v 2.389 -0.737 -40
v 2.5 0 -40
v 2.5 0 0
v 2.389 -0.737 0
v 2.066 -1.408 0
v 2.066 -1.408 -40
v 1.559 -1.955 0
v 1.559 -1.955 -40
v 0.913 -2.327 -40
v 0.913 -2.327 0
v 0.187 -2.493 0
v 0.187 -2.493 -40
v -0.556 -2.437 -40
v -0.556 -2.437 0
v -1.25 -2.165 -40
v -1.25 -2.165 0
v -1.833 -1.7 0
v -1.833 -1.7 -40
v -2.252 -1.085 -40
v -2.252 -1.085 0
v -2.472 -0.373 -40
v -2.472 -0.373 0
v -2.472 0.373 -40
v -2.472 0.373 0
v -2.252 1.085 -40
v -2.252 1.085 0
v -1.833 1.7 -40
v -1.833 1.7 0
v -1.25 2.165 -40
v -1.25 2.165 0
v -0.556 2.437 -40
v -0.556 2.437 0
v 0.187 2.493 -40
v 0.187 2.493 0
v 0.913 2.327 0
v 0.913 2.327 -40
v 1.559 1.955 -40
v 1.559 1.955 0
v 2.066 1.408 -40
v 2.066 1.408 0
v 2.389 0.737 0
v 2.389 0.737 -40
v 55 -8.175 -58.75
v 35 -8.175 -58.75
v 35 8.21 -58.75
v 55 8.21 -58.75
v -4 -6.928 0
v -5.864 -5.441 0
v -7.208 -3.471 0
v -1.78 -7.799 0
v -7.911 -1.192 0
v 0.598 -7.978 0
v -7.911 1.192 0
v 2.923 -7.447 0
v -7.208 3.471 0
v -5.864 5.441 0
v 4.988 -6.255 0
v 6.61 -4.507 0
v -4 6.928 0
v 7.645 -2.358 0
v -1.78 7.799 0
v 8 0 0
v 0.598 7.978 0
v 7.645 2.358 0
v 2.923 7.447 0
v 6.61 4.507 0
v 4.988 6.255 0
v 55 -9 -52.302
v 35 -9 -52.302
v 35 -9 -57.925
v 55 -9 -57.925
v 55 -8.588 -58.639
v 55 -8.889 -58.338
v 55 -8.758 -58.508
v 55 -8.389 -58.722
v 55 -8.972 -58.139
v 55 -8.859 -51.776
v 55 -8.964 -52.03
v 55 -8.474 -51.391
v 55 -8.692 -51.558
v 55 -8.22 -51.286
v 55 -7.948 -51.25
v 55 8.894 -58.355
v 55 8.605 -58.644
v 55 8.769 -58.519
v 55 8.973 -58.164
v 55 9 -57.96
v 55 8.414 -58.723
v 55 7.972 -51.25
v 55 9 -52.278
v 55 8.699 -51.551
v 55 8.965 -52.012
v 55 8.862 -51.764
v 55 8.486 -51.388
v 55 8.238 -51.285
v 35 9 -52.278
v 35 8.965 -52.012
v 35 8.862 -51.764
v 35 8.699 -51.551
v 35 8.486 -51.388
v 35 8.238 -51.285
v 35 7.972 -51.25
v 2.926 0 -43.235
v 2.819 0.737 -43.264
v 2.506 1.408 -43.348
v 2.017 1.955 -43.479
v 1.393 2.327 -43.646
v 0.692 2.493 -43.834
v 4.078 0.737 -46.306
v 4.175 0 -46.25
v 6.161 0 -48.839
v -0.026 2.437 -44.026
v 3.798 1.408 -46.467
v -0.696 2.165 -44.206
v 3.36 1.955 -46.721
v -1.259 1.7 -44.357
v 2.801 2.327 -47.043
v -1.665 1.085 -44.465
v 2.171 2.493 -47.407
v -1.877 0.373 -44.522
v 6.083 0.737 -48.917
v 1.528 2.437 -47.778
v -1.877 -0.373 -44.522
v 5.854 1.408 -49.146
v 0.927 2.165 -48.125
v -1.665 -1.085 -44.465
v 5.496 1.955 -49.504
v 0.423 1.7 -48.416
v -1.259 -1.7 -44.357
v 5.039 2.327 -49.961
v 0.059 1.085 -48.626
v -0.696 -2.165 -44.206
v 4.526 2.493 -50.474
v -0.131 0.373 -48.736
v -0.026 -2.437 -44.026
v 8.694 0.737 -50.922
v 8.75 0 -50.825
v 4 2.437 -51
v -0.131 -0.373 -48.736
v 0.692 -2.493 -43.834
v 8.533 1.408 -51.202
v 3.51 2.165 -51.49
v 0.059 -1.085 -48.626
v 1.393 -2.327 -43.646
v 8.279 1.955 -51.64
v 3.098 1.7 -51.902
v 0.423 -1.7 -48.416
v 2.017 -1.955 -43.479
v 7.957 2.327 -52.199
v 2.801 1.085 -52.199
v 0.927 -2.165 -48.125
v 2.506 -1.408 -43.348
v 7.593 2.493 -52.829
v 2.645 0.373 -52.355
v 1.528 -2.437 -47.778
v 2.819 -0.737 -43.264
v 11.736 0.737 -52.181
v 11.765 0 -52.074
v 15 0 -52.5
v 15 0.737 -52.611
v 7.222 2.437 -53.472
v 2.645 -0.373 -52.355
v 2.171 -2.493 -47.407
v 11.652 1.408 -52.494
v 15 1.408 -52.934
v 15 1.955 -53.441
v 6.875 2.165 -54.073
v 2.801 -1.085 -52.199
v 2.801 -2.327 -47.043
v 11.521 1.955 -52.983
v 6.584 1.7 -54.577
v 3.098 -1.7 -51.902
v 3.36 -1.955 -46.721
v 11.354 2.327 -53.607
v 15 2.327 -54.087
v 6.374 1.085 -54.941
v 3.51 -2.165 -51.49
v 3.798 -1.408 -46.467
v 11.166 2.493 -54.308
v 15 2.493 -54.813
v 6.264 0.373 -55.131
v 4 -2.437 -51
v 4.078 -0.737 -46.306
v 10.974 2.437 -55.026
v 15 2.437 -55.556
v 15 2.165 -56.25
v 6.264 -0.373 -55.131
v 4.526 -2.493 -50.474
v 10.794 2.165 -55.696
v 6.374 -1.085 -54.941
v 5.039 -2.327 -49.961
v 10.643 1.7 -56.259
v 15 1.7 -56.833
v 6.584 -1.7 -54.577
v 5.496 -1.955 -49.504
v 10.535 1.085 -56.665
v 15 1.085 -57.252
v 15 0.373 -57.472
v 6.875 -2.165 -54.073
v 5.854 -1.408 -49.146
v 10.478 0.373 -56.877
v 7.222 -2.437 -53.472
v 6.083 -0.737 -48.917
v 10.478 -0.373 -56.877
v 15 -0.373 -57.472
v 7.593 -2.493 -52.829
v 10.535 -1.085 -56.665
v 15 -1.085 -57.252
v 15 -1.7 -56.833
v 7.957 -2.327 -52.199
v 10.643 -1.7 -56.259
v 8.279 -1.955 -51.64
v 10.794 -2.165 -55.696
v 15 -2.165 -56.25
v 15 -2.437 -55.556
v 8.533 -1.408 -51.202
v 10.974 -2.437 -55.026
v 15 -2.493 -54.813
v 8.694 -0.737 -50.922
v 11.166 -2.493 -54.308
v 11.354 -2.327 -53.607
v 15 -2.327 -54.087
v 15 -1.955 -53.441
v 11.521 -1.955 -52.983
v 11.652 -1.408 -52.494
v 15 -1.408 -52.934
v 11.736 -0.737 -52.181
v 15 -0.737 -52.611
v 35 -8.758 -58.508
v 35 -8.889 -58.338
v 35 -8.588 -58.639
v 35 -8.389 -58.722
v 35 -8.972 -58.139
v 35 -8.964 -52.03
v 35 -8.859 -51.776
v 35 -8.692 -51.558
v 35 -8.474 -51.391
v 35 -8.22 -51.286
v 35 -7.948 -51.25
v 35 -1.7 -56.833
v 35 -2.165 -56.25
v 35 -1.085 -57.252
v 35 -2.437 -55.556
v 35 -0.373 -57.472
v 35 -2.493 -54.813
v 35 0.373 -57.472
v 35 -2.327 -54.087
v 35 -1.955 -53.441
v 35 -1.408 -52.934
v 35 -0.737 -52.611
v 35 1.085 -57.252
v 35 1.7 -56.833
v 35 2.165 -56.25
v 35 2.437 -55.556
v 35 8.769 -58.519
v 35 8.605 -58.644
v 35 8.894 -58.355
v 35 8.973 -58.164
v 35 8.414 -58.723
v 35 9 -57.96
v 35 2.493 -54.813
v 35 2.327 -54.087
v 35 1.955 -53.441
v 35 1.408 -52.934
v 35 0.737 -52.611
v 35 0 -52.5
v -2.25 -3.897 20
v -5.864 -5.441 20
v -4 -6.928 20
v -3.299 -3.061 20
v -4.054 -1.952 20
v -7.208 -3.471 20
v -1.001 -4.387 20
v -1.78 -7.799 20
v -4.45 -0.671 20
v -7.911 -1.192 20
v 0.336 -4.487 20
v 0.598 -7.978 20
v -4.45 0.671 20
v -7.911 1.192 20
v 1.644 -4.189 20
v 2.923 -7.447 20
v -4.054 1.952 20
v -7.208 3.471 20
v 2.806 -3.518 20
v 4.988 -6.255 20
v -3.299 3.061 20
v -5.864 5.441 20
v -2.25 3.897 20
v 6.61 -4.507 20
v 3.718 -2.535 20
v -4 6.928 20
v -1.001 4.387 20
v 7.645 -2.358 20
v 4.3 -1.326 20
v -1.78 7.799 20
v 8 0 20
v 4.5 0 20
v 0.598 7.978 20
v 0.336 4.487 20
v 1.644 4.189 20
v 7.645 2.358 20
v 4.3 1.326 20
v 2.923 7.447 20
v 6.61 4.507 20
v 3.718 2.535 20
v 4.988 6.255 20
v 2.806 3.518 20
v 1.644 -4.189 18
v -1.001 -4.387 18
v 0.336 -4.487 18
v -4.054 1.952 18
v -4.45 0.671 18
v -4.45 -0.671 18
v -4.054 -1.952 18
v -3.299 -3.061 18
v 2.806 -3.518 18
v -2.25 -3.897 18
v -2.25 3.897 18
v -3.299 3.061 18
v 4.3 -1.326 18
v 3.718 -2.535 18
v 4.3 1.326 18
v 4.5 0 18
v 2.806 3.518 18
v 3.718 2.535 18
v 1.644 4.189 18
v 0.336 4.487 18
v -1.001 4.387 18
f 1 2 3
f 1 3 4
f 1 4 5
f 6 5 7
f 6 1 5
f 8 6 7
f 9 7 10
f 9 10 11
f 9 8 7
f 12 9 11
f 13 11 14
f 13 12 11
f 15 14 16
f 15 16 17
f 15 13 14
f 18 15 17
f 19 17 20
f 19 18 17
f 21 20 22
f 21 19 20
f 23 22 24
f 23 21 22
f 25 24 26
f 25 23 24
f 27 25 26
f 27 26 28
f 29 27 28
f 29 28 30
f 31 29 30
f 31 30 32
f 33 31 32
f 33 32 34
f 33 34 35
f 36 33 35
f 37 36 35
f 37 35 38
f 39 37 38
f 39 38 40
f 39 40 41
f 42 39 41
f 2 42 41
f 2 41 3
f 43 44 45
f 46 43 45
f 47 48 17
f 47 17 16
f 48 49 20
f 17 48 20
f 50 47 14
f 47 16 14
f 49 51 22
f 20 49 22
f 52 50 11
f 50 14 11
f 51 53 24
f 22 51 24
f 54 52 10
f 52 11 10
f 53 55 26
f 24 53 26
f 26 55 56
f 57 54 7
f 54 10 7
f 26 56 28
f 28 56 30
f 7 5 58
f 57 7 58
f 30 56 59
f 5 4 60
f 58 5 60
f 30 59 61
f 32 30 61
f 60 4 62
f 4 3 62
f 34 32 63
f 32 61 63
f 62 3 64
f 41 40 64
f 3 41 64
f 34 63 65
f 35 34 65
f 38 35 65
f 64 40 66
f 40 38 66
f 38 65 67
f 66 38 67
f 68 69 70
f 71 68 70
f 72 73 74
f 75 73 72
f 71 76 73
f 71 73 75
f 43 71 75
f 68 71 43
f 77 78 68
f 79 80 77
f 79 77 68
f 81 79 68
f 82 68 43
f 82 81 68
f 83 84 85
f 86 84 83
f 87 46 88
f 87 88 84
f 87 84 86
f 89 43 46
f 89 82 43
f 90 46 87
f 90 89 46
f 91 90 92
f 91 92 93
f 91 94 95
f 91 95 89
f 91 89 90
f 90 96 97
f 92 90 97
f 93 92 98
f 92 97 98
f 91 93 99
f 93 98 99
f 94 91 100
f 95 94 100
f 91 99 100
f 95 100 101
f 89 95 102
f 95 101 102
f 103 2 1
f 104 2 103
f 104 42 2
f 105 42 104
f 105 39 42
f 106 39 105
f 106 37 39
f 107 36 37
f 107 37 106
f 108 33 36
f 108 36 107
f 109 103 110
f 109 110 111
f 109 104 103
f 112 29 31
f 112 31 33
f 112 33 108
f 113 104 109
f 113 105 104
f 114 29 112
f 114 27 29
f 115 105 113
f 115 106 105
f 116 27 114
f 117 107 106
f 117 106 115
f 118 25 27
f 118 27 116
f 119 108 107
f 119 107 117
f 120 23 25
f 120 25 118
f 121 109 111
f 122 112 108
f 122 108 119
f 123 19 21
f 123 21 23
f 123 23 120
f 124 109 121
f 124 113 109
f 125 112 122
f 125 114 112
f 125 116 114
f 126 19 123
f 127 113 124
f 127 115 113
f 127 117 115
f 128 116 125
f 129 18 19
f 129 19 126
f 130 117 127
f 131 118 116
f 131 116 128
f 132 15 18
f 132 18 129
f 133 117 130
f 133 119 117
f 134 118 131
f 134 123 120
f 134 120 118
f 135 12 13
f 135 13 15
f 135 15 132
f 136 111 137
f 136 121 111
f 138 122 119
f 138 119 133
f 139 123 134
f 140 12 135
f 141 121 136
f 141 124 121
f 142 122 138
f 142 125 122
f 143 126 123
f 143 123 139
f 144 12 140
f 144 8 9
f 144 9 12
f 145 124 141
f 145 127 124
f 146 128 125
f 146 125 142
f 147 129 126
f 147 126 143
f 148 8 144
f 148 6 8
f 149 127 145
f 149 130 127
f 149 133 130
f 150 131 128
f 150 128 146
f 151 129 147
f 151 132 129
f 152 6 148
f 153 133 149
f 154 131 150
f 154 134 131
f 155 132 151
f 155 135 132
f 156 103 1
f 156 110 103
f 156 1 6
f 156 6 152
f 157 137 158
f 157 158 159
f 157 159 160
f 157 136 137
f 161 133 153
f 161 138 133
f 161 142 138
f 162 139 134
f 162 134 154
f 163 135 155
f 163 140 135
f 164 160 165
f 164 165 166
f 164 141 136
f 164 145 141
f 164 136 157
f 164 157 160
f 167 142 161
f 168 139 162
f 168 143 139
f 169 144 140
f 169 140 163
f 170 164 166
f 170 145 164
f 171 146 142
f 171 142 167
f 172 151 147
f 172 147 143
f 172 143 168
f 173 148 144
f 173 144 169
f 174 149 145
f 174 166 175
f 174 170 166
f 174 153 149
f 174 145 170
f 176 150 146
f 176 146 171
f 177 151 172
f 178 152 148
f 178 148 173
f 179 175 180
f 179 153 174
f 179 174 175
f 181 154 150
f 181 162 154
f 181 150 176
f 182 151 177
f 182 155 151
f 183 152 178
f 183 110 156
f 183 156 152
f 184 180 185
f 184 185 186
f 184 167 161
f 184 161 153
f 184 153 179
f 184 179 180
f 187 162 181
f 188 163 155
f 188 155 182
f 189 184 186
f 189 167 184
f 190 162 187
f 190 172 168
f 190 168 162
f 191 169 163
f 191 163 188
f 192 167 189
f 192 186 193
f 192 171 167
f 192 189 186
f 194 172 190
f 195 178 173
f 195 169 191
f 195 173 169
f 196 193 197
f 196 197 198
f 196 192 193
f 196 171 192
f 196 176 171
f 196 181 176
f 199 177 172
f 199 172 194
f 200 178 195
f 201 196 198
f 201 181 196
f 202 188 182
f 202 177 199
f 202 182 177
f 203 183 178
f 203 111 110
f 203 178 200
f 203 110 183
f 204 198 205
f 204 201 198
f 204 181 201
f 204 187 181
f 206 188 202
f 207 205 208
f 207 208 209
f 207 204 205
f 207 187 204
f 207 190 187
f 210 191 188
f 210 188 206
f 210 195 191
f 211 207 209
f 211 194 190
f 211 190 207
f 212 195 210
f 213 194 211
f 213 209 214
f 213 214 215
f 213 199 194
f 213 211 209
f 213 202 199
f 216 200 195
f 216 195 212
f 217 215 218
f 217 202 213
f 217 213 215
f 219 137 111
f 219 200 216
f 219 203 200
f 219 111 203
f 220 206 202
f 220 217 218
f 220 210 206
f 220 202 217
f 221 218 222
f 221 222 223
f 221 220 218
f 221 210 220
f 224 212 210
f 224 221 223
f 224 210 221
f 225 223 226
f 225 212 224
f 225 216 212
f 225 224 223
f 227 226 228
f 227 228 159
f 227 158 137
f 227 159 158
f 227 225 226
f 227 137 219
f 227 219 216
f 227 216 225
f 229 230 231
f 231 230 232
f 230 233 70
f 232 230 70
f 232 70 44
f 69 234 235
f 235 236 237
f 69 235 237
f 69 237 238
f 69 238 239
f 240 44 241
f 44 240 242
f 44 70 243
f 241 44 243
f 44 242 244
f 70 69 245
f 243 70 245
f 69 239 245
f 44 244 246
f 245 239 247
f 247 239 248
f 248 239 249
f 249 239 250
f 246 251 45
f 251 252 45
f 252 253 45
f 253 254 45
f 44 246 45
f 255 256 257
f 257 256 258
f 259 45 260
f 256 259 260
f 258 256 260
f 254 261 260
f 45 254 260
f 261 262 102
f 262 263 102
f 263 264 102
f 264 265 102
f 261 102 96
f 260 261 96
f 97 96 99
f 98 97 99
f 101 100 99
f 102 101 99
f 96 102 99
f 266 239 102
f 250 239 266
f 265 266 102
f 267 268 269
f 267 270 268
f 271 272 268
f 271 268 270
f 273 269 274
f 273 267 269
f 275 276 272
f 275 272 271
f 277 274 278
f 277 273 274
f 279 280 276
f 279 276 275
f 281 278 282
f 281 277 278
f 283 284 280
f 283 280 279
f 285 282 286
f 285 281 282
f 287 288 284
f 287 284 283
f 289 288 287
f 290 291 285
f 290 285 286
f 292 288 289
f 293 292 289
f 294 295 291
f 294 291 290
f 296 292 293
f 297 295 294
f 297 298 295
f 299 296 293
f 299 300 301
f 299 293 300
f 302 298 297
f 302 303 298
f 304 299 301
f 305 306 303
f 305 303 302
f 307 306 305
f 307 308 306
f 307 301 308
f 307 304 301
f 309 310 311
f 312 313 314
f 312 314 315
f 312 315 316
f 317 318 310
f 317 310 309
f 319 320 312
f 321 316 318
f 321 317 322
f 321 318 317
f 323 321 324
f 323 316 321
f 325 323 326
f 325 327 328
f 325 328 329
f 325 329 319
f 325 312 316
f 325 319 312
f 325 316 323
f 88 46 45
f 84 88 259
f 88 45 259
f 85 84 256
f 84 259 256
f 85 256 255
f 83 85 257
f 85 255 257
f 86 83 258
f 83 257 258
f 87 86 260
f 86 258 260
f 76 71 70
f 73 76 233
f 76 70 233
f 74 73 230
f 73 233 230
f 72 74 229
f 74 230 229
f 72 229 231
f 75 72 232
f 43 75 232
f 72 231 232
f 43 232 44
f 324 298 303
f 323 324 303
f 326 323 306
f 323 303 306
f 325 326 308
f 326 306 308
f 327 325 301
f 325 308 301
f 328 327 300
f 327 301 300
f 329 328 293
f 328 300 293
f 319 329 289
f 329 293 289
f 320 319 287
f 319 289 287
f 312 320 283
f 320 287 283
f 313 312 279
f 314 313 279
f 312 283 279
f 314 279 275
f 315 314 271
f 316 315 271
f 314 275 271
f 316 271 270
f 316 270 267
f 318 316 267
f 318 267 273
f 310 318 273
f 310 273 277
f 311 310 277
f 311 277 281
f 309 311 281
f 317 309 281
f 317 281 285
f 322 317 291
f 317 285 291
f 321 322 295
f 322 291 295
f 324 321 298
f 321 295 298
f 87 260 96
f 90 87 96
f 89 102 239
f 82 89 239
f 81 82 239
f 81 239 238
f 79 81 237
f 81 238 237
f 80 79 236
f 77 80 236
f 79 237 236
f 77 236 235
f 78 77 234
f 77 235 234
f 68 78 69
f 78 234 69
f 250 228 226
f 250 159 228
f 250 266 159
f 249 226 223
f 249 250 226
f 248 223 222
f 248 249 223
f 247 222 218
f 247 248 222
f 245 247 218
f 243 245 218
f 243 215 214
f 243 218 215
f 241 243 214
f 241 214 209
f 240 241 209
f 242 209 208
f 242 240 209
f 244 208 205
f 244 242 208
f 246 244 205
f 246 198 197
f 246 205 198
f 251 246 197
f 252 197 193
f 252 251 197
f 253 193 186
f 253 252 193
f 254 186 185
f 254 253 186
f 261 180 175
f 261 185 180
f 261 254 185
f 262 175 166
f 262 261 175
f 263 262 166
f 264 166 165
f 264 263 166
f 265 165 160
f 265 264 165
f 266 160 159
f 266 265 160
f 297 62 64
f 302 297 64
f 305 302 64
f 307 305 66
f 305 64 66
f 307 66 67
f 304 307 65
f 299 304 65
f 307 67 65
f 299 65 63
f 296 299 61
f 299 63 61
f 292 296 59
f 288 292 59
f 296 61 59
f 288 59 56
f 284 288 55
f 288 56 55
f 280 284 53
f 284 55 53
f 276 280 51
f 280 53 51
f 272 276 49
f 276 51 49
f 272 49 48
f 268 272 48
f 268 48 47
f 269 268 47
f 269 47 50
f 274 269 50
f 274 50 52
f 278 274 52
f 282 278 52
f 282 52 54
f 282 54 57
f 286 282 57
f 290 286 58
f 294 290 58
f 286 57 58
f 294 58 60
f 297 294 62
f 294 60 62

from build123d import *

# Parameters (mm, degrees)
SKETCH_R     = 8
PAD_DEPTH    = 20
SKETCH002_R  = 2.5
SKETCH003_R  = 4.5
POCKET_DEPTH = 2
PAD001_DEPTH = 20


with BuildPart() as part:
    # Sketch → Pad (new body)
    with BuildSketch(Plane.XY):
        Circle(SKETCH_R)
    extrude(amount=PAD_DEPTH)

    # AdditivePipe: sweep along a path in Sketch001
    with BuildLine(Plane.XZ) as additivepipe_path:
        Line((0, 0), (0, -40))
        ThreePointArc((0, -40), (4.393398, -50.606602), (15, -55))
        Line((15, -55), (35, -55))
    # Sketch002 (on Face2 of Pad) → AdditivePipe (sweep)
    with BuildSketch(Plane(origin=(0, 0, 0), x_dir=(1, 0, 0), z_dir=(0, 0, -1))):
        Circle(SKETCH002_R)
    sweep(path=additivepipe_path.line)

    # Sketch003 (on Face3 of AdditivePipe) → Pocket (cut)
    with BuildSketch(Plane.XY.offset(20)):
        Circle(SKETCH003_R)
    extrude(amount=-POCKET_DEPTH, mode=Mode.SUBTRACT)

    # Sketch004 (on Face9 of Pocket) → Pad001 (join)
    with BuildSketch(Plane.YZ.offset(35)):
        with BuildLine():
            Line((-9, -52.301853), (-9, -57.925102))
            ThreePointArc((-9, -57.925102), (-8.758393, -58.508393), (-8.175102, -58.75))
            Line((-8.175102, -58.75), (8.209949, -58.75))
            ThreePointArc((8.209949, -58.75), (8.7686, -58.5186), (9, -57.959949))
            Line((9, -57.959949), (9, -52.278293))
            ThreePointArc((9, -52.278293), (8.69882, -51.55118), (7.971707, -51.25))
            Line((7.971707, -51.25), (-7.948147, -51.25))
            ThreePointArc((-7.948147, -51.25), (-8.691919, -51.558081), (-9, -52.301853))
        make_face()
    extrude(amount=PAD001_DEPTH)


solid = part.part
